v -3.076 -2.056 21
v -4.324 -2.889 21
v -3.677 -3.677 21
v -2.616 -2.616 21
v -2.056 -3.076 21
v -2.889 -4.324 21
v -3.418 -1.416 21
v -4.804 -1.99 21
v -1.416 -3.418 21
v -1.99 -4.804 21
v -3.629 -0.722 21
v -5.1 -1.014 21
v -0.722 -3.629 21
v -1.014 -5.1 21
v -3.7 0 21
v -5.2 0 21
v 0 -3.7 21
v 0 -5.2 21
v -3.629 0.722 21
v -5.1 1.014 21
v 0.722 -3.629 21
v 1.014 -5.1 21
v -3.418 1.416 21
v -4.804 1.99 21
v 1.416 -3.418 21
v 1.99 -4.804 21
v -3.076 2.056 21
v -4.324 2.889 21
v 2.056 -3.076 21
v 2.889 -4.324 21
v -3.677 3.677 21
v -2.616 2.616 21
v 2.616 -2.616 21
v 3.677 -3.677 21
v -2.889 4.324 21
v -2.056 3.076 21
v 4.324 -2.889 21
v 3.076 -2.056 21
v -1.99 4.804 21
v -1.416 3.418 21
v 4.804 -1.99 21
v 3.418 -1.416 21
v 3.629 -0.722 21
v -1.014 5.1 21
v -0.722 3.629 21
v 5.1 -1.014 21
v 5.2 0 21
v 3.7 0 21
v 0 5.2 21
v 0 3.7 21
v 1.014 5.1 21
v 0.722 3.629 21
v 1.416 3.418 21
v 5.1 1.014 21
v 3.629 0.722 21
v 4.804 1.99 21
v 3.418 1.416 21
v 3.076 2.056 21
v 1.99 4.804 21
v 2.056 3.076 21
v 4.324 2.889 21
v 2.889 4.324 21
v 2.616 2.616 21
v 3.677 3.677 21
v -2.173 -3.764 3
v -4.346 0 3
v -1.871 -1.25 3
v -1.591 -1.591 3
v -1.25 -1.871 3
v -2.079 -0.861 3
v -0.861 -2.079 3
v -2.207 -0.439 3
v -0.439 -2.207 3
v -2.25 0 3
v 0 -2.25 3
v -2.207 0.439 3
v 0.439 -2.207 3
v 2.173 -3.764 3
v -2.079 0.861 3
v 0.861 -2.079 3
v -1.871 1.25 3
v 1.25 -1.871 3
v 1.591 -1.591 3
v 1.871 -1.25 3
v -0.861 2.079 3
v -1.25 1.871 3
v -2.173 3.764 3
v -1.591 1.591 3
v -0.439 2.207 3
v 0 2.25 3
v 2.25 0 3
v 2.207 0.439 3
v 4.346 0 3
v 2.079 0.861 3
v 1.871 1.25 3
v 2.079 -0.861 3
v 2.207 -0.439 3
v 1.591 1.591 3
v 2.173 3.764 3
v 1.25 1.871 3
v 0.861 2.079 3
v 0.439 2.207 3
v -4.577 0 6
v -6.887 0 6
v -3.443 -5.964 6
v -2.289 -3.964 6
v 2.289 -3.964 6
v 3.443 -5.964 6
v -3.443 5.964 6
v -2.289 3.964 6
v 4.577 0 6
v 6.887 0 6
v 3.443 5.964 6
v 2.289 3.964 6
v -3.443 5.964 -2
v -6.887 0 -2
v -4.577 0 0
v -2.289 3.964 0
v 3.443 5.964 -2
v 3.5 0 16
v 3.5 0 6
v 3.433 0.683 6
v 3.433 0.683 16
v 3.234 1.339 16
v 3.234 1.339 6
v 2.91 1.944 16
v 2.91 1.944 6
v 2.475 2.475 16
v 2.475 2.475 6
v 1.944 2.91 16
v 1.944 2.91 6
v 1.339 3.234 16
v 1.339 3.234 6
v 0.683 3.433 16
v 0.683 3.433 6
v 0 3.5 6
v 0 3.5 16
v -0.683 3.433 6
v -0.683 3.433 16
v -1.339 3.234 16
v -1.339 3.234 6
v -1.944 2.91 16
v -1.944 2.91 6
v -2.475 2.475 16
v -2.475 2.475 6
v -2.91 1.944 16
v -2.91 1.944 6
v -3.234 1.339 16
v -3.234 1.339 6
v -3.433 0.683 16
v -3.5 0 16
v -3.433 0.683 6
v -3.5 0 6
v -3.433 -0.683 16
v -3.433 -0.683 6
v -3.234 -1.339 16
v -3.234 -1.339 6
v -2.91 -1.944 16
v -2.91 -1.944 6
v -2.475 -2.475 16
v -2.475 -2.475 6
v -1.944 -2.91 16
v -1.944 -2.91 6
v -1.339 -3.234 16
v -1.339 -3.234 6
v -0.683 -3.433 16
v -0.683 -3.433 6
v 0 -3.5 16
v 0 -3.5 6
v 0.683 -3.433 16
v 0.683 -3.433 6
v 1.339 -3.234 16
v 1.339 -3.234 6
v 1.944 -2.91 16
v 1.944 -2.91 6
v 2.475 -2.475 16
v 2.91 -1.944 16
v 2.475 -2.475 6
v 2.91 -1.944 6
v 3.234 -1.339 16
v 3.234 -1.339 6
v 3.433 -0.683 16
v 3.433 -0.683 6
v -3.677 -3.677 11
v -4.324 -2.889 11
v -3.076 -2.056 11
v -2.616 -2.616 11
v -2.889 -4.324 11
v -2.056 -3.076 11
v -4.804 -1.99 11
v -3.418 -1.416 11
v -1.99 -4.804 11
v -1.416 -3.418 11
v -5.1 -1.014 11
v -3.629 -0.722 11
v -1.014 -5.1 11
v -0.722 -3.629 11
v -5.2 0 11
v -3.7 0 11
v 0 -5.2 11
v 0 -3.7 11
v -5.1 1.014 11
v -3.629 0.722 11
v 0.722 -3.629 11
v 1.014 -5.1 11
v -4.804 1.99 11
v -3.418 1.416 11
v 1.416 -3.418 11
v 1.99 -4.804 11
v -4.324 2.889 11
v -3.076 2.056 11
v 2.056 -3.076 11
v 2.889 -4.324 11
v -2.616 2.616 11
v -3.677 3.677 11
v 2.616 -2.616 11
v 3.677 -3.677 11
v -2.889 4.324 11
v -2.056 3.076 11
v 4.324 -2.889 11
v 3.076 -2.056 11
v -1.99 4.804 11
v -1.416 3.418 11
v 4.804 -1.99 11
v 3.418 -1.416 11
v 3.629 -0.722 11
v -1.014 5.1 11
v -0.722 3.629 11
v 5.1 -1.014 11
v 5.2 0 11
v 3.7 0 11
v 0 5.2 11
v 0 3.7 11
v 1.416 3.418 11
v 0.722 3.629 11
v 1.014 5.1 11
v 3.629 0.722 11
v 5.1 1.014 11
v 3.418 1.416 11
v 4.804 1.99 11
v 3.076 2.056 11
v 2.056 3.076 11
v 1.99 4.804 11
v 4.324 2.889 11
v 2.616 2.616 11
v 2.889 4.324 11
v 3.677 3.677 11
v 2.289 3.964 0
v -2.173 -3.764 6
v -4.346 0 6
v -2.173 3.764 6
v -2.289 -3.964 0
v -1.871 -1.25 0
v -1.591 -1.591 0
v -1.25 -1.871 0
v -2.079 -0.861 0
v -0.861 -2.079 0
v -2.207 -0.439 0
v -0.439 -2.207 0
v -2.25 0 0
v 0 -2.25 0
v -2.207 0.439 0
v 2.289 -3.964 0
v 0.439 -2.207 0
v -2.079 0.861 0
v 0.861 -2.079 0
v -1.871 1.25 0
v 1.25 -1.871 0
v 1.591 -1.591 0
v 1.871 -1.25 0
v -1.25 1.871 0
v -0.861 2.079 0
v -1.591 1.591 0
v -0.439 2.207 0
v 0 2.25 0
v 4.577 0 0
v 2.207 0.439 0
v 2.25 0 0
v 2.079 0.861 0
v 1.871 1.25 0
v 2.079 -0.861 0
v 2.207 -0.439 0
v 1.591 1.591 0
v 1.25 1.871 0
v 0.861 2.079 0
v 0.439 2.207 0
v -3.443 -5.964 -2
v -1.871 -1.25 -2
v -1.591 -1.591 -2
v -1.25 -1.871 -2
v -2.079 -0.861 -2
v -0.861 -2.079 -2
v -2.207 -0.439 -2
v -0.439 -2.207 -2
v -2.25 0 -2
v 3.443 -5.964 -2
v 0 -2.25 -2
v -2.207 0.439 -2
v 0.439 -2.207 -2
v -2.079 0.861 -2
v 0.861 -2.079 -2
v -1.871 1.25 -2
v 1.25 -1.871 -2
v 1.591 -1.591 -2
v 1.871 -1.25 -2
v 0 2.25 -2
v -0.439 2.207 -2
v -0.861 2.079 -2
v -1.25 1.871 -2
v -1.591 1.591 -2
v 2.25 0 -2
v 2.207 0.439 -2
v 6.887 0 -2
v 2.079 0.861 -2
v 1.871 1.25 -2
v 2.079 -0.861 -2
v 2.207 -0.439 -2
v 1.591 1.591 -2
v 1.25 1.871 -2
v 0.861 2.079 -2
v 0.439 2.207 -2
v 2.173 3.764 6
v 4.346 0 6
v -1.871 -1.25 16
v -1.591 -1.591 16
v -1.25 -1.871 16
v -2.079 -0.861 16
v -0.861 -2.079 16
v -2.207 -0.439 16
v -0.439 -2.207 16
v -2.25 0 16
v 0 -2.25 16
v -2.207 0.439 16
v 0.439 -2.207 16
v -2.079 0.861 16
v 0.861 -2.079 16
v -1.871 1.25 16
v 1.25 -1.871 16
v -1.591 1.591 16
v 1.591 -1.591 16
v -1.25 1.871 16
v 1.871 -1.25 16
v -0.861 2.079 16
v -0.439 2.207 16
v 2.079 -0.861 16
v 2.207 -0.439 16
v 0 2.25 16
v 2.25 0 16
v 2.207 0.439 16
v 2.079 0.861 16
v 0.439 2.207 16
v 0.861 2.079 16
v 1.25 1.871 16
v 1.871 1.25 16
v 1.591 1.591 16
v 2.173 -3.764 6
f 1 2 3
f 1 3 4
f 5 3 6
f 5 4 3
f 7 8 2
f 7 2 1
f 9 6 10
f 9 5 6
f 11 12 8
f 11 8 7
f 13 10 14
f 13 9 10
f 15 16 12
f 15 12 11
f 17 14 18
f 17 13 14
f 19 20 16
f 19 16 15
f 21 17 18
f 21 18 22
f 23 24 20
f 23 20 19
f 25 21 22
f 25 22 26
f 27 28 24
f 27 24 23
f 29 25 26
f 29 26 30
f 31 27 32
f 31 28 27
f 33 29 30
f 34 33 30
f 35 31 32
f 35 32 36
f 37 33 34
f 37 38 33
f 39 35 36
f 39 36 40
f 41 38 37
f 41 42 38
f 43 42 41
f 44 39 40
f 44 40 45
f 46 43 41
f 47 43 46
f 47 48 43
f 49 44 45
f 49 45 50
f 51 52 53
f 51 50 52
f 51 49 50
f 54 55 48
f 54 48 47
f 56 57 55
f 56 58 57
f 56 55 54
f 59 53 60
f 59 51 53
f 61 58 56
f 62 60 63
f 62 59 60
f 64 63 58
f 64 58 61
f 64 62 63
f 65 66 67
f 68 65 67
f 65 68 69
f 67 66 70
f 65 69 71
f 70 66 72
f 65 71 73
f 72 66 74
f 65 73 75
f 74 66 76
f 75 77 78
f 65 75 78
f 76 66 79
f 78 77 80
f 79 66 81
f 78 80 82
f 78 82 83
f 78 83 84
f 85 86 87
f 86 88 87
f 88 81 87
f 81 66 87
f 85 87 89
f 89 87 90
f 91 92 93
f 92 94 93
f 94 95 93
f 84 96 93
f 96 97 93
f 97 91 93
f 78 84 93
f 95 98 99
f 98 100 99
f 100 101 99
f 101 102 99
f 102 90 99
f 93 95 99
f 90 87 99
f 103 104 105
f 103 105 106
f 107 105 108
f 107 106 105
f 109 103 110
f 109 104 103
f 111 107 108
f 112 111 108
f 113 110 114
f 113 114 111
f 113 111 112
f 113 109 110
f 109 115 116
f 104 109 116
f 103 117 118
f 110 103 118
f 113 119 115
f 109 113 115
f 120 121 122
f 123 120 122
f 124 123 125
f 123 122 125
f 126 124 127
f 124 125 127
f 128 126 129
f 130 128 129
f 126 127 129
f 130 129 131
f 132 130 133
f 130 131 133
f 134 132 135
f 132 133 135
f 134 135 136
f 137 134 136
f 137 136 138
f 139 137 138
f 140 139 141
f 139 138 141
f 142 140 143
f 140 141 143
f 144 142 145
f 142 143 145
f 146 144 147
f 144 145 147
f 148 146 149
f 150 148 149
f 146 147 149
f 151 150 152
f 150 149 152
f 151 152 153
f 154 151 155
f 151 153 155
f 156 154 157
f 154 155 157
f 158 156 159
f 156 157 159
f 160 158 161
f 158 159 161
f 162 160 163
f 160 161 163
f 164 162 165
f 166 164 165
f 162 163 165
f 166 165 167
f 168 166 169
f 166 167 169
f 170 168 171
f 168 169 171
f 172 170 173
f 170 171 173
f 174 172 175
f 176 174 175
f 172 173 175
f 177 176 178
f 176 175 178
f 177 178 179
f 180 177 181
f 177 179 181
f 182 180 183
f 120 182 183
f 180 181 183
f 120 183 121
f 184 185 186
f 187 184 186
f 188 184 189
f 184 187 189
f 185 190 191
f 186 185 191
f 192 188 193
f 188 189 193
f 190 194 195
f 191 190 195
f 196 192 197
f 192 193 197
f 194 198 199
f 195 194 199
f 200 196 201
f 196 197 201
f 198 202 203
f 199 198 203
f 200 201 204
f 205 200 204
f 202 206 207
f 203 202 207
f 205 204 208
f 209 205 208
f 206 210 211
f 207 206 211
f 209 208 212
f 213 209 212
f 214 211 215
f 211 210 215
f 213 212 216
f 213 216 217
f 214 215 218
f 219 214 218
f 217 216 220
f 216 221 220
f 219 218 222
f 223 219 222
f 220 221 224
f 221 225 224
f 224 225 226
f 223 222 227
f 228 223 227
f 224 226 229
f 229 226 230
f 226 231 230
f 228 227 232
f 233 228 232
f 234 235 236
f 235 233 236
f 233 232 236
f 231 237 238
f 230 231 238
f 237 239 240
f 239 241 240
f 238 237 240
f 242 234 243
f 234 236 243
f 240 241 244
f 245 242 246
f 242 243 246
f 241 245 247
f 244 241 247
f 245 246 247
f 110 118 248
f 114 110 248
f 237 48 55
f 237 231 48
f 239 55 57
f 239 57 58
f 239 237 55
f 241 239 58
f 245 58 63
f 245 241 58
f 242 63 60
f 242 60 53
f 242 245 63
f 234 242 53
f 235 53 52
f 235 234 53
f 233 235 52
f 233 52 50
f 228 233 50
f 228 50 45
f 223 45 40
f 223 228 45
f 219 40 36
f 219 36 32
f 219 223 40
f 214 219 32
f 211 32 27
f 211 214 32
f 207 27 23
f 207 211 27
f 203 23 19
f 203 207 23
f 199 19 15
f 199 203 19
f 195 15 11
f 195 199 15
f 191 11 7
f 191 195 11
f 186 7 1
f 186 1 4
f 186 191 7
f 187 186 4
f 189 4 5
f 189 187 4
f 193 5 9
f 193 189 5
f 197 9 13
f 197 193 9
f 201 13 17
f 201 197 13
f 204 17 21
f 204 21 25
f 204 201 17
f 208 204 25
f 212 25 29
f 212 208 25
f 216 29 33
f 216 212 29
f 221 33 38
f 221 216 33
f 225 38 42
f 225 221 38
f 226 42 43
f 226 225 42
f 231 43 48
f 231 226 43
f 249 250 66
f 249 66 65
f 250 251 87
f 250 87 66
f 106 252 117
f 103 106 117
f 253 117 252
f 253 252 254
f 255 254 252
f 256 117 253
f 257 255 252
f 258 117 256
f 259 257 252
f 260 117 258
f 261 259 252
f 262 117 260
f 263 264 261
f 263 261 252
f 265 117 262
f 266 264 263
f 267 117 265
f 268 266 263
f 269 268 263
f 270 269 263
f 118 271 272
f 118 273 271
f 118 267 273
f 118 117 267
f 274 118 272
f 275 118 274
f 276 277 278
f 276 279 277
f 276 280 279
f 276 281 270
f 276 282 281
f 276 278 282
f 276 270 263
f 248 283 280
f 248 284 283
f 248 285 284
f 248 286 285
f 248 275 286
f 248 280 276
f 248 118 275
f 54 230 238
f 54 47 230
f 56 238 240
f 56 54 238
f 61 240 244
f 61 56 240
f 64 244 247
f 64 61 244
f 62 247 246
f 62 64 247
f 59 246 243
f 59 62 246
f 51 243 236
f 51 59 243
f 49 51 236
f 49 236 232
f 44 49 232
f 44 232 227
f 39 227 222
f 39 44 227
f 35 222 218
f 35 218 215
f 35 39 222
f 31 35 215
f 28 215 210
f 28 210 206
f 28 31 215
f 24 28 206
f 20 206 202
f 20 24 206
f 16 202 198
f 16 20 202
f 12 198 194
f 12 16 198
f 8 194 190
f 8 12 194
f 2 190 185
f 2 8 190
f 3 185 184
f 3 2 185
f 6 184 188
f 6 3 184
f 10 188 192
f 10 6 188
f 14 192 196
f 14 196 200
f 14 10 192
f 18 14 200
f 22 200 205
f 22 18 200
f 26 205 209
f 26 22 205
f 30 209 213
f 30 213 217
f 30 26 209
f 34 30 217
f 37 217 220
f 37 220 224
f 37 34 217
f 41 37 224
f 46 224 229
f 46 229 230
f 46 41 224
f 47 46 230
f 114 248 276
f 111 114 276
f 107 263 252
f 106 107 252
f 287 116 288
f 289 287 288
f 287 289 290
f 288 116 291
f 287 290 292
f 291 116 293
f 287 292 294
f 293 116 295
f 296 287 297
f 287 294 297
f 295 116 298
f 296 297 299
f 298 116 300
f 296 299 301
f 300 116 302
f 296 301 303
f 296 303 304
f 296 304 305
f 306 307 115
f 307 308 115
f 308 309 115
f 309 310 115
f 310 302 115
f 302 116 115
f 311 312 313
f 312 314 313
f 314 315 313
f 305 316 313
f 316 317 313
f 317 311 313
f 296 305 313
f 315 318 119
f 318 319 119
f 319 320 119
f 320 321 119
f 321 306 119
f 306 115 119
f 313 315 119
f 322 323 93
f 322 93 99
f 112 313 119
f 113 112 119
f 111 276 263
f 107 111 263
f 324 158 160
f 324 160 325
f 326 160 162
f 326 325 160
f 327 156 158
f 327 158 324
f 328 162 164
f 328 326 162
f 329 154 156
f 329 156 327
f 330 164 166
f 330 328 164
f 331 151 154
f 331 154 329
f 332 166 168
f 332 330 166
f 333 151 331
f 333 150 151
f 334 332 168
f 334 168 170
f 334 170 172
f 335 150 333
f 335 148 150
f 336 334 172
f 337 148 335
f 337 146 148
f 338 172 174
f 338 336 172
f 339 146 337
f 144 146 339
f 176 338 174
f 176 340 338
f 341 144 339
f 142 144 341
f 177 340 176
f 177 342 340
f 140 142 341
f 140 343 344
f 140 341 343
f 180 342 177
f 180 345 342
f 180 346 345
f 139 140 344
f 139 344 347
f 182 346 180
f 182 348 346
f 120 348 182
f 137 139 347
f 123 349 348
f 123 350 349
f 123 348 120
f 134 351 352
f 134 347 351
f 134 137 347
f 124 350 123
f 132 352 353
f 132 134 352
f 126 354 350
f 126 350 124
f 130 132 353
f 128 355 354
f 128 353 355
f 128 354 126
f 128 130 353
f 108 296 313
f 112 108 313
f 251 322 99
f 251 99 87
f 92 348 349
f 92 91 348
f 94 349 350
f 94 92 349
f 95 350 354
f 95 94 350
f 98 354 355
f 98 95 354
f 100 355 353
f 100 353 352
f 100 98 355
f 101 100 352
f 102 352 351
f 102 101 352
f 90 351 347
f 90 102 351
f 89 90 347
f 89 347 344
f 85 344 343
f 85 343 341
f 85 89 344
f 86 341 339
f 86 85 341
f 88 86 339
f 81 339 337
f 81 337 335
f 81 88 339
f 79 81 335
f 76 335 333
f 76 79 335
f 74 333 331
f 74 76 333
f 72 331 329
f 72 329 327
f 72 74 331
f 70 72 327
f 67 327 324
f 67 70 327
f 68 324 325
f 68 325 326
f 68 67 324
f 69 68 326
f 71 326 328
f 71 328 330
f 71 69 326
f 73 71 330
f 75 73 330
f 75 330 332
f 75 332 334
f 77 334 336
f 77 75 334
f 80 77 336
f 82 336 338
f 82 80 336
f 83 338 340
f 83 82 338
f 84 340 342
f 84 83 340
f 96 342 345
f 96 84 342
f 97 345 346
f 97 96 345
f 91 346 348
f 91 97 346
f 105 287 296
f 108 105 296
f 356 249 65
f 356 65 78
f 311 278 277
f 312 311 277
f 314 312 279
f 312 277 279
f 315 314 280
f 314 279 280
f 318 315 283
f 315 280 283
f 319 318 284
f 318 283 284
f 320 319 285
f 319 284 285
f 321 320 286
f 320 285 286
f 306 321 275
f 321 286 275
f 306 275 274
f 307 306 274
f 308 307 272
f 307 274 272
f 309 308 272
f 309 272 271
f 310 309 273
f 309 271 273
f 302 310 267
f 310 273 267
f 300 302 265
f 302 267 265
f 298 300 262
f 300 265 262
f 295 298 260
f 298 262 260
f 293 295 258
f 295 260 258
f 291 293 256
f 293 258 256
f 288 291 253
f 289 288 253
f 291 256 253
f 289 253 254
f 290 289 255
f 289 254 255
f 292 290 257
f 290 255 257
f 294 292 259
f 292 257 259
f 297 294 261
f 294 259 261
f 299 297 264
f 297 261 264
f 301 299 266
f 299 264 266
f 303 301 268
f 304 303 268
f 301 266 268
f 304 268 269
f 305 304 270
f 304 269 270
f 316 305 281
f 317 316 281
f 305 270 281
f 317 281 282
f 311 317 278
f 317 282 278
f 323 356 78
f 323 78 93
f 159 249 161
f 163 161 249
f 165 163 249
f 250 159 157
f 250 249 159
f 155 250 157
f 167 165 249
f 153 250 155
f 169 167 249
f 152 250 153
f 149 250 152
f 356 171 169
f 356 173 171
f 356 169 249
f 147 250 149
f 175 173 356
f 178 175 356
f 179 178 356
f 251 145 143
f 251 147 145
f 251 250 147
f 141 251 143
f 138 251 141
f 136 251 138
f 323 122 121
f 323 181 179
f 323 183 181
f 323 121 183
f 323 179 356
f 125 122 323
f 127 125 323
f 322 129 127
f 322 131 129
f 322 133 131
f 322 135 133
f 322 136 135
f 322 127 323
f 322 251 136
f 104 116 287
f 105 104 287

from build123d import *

# Parameters (mm, degrees)
F1_DEPTH = 6
F0_R     = 2.25
F2_DEPTH = 2
F3_R     = 3.5
F3_R_2   = 2.25
F4_DEPTH = 3
F5_DEPTH = 10
F6_R     = 5.2
F6_R_2   = 3.7
F7_DEPTH = 5


with BuildPart() as f1:
    # F0 (on Top) → F1 (new body)
    with BuildSketch(Plane.XY):
        Polygon((3.443375673, 5.9641016151), (-3.443375673, 5.9641016151), (-6.8867513459, 0), (-3.443375673, -5.9641016151), (3.443375673, -5.9641016151), (6.8867513459, 0), align=None)
        Polygon((-2.2886751346, -3.9641016151), (-4.5773502692, 0), (-2.2886751346, 3.9641016151), (2.2886751346, 3.9641016151), (4.5773502692, 0), (2.2886751346, -3.9641016151), align=None, mode=Mode.SUBTRACT)
    extrude(amount=F1_DEPTH)

    # F0 (on Top) → F2 (join)
    with BuildSketch(Plane.XY):
        Polygon((3.443375673, 5.9641016151), (-3.443375673, 5.9641016151), (-6.8867513459, 0), (-3.443375673, -5.9641016151), (3.443375673, -5.9641016151), (6.8867513459, 0), align=None)
        Polygon((-2.2886751346, -3.9641016151), (-4.5773502692, 0), (-2.2886751346, 3.9641016151), (2.2886751346, 3.9641016151), (4.5773502692, 0), (2.2886751346, -3.9641016151), align=None, mode=Mode.SUBTRACT)
        Polygon((-2.2886751346, 3.9641016151), (-4.5773502692, 0), (-2.2886751346, -3.9641016151), (2.2886751346, -3.9641016151), (4.5773502692, 0), (2.2886751346, 3.9641016151), align=None)
        Polygon((2, 3.4641016151), (4, 0), (2, -3.4641016151), (-2, -3.4641016151), (-4, 0), (-2, 3.4641016151), align=None, mode=Mode.SUBTRACT)
        Polygon((2, -3.4641016151), (4, 0), (2, 3.4641016151), (-2, 3.4641016151), (-4, 0), (-2, -3.4641016151), align=None)
        Circle(F0_R, mode=Mode.SUBTRACT)
    extrude(amount=-F2_DEPTH)


with BuildPart() as f4:
    # F3 (on face) → F4 (new body)
    with BuildSketch(Plane.XY.offset(6)):
        Polygon((-2.1732050808, 3.7641016151), (-4.3464101615, 0), (-2.1732050808, -3.7641016151), (2.1732050808, -3.7641016151), (4.3464101615, 0), (2.1732050808, 3.7641016151), align=None)
        Circle(F3_R, mode=Mode.SUBTRACT)
        Circle(F3_R)
        Circle(F3_R_2, mode=Mode.SUBTRACT)
    extrude(amount=-F4_DEPTH)

    # F3 (on face) → F5 (join)
    with BuildSketch(Plane.XY.offset(6)):
        Circle(F3_R)
        Circle(F3_R_2, mode=Mode.SUBTRACT)
    extrude(amount=F5_DEPTH)


with BuildPart() as f7:
    # F6 (on face) → F7 (new body, symmetric)
    with BuildSketch(Plane.XY.offset(16)):
        Circle(F6_R)
        Circle(F6_R_2, mode=Mode.SUBTRACT)
    extrude(amount=F7_DEPTH, both=True)


solid = Compound([f1.part, f4.part, f7.part])
